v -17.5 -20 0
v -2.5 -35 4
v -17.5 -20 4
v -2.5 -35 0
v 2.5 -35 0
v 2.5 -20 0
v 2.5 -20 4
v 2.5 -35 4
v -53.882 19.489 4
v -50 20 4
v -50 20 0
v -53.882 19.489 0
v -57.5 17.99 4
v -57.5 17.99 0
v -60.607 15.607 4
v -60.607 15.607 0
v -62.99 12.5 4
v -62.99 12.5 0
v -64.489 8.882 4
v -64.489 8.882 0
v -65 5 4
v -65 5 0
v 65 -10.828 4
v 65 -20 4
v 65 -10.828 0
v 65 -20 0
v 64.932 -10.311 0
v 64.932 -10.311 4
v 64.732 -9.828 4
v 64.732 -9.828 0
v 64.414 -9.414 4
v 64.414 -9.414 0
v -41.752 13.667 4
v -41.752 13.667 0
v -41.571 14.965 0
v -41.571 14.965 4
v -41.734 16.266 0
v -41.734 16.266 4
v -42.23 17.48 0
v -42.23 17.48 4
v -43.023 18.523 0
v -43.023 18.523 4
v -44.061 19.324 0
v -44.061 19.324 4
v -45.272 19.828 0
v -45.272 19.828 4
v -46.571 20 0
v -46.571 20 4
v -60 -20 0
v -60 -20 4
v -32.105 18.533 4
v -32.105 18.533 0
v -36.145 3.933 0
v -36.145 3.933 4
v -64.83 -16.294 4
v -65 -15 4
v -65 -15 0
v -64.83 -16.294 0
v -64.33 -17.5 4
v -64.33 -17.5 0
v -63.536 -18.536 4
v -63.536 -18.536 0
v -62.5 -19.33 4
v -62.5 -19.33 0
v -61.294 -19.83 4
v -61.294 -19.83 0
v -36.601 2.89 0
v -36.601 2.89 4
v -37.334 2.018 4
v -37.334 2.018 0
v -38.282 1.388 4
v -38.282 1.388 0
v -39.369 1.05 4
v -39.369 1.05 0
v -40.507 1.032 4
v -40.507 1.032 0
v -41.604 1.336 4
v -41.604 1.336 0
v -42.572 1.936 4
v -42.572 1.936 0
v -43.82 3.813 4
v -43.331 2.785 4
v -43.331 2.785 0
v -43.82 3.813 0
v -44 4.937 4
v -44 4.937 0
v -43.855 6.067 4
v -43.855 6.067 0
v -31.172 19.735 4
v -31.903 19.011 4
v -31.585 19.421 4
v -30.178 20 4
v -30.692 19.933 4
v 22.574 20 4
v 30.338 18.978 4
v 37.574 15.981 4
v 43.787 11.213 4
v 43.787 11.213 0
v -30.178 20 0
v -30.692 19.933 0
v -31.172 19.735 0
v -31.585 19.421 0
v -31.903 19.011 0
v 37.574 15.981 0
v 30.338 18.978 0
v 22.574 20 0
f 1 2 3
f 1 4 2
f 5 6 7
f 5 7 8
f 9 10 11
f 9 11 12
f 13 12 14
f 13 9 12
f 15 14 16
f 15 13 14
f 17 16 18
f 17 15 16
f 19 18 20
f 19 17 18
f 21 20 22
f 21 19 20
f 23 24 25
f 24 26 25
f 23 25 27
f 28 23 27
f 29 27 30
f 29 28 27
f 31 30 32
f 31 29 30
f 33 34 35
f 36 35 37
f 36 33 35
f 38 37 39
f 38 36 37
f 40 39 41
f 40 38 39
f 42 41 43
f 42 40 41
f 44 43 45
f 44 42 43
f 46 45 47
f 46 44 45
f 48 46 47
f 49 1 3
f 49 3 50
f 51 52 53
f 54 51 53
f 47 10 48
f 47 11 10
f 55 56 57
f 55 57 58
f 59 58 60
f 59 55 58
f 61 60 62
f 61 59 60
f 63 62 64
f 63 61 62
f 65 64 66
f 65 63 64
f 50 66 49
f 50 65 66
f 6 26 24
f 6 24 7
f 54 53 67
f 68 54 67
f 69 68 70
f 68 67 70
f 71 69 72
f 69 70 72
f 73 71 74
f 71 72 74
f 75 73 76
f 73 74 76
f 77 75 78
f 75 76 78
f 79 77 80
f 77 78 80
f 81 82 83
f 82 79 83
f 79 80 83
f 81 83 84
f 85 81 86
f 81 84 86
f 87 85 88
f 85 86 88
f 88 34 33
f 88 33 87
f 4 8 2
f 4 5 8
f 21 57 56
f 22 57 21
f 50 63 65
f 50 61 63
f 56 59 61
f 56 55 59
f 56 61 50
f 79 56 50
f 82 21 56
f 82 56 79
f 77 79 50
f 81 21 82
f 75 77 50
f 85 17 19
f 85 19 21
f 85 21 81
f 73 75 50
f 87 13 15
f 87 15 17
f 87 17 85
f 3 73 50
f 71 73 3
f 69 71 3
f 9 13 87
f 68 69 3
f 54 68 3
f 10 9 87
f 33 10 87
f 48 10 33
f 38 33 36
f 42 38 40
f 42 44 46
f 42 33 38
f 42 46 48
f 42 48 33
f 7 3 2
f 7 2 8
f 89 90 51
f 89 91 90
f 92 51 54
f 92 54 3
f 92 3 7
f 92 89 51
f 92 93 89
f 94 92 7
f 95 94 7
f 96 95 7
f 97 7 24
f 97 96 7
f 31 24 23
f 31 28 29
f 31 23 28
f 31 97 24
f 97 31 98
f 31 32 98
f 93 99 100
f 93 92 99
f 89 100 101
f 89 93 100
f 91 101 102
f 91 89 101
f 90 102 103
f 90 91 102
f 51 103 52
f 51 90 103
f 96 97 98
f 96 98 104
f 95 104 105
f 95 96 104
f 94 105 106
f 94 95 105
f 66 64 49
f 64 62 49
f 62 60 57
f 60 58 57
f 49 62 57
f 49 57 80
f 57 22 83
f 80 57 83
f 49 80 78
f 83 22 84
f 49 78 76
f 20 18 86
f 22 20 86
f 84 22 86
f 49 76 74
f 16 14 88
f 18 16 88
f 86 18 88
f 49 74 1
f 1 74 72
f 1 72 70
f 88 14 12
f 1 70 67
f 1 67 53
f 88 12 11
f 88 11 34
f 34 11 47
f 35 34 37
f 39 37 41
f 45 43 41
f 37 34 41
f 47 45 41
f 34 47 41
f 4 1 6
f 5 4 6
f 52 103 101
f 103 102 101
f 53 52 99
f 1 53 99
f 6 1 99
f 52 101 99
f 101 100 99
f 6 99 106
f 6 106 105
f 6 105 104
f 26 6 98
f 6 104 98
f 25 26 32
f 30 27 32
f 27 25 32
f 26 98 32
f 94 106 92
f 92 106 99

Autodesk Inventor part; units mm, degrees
ref_plane "YZ Plane" through (0, 0, 0) normal (1, 0, 0) x (0, 1, 0)
ref_plane "XZ Plane" through (0, 0, 0) normal (0, 1, 0) x (-1, 0, 0)
ref_plane "XY Plane" through (0, 0, 0) normal (0, 0, 1) x (1, 0, 0)
sketch "Sketch3" plane through (0, 0, 0) normal (0, 0, 1) x (1, 0, 0)
  line L0 (-91, 0) -> (91, 0) projected
  line L1 (0, -48.6774) -> (0, 47.0644) projected
  line L2 (65, -10) -> (35, 20)
  line L3 (35, 20) -> (-31.6994, 20)
  line L4 (-31.6994, 20) -> (-36.1448, 3.9333)
  line L5 (65, -20) -> (2.5, -20)
  line L6 (2.5, -20) -> (2.5, -35)
  line L7 (2.5, -35) -> (-2.5, -35)
  line L8 (-2.5, -35) -> (-17.5, -20)
  line L9 (-17.5, -20) -> (-65, -20)
  line L10 (-65, -20) -> (-65, 20)
  line L11 (-65, 20) -> (-40, 20)
  line L12 (65, -20) -> (65, -10)
  line L13 (-40, 20) -> (-43.8552, 6.0667)
  arc A0 (-43.8552, 6.0667) -> (-36.1448, 3.9333) centre (-40, 5) ccw
  line L14 (-26.282, 1.2044) -> (-45.4203, 6.4997) construction
  line L15 (-40, -18.8457) -> (-40, 33.387) construction
  point P0 (0, 0)
  dimension "d0" = 130
  dimension "d1" = 40
  dimension "d2" = 10
  dimension "d4" = 5
  dimension "d5" = 20
  dimension "d6" = 30
  dimension "d8" = 55
  dimension "d11" = 8
  dimension "d12" = 25
  dimension "d16" = 8
  dimension "d23" = 15
extrude "Extrusion1" add sketch "Sketch3" along normal blind 4
fillet "Fillet1" radius 2 2 edges at (-31.6994, 20, 2) (65, -10, 2)
fillet "Fillet2" radius 30 1 edges at (35, 20, 2)
fillet "Fillet3" radius 5 2 edges at (-40, 20, 2) (-65, -20, 2)
fillet "Fillet4" radius 15 1 edges at (-65, 20, 2)
equation "\"BendRadius\" = Thickness"
equation "\"BendReliefWidth\" = Thickness"
equation "\"BendReliefDepth\" = 0.5 * Thickness"
equation "\"CornerReliefSize\" = 4 * Thickness"
equation "\"MinimumRemnant\" = 2 * Thickness"
equation "\"TransitionRadius\" = BendRadius"
equation "\"JacobiRadiusSize\" = BendRadius"
equation "\"GapSize\" = Thickness"
equation "\"Thickness\" = 0.5"
properties part number "Rear Wheel Holder"
